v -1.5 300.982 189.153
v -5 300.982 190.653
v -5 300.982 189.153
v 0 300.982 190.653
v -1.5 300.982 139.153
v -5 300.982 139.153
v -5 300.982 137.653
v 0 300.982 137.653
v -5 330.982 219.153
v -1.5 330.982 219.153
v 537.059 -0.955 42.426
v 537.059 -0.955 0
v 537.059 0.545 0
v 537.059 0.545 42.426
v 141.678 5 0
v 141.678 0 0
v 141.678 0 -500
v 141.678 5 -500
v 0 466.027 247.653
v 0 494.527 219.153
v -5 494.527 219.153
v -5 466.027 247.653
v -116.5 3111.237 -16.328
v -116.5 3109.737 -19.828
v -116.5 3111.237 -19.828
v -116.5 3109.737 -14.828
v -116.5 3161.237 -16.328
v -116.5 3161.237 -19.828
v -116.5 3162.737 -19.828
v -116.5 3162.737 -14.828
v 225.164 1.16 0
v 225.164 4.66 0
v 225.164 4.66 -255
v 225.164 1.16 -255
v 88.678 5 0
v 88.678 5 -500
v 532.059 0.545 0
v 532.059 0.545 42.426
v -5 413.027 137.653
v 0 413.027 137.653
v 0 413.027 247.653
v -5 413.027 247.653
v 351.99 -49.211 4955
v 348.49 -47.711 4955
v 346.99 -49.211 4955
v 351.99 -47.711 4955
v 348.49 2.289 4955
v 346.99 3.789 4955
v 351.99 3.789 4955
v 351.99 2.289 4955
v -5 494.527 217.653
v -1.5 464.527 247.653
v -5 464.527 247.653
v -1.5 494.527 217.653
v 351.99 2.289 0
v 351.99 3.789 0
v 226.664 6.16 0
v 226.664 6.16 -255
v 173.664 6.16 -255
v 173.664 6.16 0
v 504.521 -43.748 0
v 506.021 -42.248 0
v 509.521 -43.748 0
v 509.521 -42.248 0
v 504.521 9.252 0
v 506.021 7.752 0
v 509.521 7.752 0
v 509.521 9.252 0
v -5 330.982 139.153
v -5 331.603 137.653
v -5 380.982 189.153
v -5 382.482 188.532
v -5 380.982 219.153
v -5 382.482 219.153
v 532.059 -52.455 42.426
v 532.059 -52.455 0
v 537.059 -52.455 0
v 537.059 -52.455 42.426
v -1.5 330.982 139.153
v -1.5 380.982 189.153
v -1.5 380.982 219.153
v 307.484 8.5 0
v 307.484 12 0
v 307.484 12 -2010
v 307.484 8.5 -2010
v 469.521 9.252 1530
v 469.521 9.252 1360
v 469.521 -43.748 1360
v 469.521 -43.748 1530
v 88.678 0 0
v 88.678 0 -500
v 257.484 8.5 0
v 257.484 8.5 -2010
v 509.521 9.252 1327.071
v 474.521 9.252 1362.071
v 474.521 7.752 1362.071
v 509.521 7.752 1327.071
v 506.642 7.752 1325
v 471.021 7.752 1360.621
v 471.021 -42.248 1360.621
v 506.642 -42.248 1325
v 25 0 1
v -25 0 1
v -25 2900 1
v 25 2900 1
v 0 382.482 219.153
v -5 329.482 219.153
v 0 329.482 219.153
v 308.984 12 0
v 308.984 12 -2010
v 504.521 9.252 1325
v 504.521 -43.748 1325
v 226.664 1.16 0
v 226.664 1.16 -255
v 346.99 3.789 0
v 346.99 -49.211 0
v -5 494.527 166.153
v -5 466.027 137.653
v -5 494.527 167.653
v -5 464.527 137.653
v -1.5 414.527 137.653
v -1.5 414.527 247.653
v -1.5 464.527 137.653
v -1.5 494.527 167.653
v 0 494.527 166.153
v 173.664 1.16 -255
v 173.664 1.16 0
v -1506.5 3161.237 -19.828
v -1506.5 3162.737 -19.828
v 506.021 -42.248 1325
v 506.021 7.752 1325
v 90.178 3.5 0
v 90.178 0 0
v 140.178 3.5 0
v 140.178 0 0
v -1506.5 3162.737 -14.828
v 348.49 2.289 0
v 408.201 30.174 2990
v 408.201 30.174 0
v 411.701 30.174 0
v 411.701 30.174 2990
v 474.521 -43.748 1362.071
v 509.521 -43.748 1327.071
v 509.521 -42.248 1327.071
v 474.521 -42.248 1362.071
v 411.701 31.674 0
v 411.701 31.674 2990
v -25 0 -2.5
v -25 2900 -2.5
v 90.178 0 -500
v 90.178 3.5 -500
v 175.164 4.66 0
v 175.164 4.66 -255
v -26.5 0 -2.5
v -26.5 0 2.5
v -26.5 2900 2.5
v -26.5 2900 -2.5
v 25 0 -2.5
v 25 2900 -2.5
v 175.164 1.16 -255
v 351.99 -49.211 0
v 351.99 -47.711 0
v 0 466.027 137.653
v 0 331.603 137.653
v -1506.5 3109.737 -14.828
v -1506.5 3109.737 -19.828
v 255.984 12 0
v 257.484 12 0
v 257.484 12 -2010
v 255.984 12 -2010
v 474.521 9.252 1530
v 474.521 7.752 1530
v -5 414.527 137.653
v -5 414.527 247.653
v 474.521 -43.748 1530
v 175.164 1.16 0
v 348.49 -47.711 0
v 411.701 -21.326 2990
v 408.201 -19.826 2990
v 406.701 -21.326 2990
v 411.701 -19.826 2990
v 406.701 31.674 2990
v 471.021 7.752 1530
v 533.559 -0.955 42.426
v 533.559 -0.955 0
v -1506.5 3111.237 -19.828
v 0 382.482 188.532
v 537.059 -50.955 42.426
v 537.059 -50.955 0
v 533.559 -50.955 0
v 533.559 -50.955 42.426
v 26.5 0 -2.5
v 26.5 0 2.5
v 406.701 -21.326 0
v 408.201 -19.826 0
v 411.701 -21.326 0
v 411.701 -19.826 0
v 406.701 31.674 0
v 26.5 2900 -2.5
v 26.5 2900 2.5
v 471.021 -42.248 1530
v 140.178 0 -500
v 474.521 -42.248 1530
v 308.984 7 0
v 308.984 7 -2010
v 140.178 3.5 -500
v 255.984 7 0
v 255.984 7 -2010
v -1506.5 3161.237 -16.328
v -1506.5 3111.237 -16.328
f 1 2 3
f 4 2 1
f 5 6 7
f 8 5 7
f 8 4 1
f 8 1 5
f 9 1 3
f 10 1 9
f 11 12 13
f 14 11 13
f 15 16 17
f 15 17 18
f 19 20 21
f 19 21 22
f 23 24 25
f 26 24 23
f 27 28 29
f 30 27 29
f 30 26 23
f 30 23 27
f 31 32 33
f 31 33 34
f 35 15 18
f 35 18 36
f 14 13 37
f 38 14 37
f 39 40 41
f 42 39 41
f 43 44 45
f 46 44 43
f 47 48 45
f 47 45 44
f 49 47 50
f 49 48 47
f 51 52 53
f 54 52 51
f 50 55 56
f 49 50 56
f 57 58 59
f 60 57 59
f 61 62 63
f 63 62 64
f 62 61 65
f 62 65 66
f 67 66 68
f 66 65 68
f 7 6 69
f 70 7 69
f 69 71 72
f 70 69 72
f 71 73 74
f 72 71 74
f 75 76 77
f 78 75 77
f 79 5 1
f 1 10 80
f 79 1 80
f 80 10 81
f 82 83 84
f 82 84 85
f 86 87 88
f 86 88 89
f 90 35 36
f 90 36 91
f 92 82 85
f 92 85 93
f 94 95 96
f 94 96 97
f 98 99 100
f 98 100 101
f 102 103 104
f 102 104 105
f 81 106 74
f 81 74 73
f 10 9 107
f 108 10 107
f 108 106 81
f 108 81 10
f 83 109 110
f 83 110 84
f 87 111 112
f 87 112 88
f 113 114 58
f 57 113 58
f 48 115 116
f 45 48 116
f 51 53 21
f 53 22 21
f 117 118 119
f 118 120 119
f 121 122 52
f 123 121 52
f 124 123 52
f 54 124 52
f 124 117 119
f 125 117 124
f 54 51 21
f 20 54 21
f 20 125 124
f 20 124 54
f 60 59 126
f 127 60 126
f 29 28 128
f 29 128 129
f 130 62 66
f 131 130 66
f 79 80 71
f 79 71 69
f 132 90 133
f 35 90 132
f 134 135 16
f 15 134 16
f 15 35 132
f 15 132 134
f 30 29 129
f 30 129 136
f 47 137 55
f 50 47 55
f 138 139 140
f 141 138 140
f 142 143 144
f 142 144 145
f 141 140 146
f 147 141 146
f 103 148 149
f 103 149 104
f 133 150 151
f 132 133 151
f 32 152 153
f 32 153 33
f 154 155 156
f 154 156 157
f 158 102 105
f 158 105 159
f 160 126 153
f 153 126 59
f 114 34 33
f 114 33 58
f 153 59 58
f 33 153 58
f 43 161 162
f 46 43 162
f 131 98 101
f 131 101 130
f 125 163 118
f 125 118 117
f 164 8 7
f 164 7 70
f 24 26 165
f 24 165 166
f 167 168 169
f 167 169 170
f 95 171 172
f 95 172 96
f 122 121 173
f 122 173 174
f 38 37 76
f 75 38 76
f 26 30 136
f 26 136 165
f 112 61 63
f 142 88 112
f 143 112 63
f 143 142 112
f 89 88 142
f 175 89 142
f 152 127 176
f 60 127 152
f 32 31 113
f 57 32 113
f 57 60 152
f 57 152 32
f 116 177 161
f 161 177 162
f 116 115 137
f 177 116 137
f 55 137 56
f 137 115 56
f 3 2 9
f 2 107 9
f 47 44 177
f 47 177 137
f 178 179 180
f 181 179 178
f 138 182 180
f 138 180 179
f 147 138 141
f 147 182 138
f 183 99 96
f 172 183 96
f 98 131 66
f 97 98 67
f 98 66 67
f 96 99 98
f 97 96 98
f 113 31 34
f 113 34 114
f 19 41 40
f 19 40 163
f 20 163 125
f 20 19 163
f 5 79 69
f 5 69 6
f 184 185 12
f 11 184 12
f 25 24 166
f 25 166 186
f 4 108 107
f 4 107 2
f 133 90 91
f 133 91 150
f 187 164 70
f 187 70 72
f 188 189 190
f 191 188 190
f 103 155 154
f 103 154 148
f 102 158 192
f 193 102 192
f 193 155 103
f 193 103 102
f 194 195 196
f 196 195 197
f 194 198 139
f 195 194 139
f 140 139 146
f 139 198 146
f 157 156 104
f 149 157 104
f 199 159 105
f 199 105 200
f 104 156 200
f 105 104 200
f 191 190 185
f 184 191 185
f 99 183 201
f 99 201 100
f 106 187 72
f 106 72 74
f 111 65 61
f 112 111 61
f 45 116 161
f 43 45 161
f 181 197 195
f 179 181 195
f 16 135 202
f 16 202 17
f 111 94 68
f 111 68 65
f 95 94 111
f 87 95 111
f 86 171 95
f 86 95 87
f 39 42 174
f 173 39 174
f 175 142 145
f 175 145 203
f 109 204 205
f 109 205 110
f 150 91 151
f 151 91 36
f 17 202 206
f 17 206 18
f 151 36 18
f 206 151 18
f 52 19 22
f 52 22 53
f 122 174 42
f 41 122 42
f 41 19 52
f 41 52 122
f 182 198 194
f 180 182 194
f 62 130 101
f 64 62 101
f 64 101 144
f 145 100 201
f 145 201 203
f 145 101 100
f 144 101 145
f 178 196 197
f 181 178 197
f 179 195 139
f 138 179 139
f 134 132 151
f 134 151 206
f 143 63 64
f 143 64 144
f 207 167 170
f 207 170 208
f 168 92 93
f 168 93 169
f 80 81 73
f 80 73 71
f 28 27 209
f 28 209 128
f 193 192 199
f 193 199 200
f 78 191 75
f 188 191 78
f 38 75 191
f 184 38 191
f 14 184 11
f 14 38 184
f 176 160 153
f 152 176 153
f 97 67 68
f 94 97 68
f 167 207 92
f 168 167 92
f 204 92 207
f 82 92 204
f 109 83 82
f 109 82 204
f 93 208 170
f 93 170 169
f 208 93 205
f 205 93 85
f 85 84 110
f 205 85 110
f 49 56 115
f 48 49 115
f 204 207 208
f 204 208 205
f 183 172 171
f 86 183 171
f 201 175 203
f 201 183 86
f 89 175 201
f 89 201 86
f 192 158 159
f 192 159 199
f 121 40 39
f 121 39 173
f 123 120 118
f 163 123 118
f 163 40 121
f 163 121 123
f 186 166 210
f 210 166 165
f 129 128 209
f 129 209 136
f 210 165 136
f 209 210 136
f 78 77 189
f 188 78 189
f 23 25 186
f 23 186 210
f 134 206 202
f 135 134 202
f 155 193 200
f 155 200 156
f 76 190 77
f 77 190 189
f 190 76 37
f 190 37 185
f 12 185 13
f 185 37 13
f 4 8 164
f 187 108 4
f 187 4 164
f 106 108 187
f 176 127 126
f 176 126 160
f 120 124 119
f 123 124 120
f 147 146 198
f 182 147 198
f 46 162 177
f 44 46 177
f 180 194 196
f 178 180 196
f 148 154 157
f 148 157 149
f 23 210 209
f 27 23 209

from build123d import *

# Parameters (mm, degrees)
F1_DEPTH  = 2900
F3_DEPTH  = 1.5
F2_W      = 1.5
F2_H      = 1.5
F2_W_2    = 107
F5_DEPTH  = 5
F4_W      = 110
F4_H      = 1.5
F8_DEPTH  = 1390
F12_DEPTH = 500
F14_DEPTH = 255
F16_DEPTH = 2010
F18_DEPTH = 4955
F20_DEPTH = 2990
F22_DEPTH = 1325
F24_DEPTH = 53
F26_DEPTH = 1.5
F28_DEPTH = 1.5
F30_DEPTH = 1.5
F32_DEPTH = 5
F33_W     = 1.5
F33_H     = 110
F34_DEPTH = 1.5
F35_W     = 1.5
F35_H     = 110
F36_DEPTH = 5
F38_DEPTH = 42.426


with BuildPart() as f1:
    # F0 (on Front) → F1 (new body)
    with BuildSketch(Plane.XZ):
        Polygon((26.5, 2.5), (-26.5, 2.5), (-26.5, -2.5), (-25, -2.5), (-25, 1), (25, 1), (25, -2.5), (26.5, -2.5), align=None)
    extrude(amount=-F1_DEPTH)


with BuildPart() as f3:
    # F2 (on face) → F3 (new body)
    with BuildSketch(Plane.XY.offset(2.5)):
        Polygon((-53.1268492341, 3159.1791344084), (-53.1268492341, 3107.1035304006), (-15.9251292085, 3065.7682859277), (36.2429143985, 3065.7682859277), (36.2429143985, 3097.8594257045), (-20.97491274, 3159.1791344084), align=None)
        Polygon((-15.2570856015, 3067.2682859277), (-51.6268492341, 3107.6791344084), (-51.6268492341, 3157.6791344084), (-21.6268492341, 3157.6791344084), (34.7429143985, 3097.2682859277), (34.7429143985, 3067.2682859277), align=None, mode=Mode.SUBTRACT)
        Polygon((-51.6268492341, 3157.6791344084), (-51.6268492341, 3107.6791344084), (-15.2570856015, 3067.2682859277), (34.7429143985, 3067.2682859277), (34.7429143985, 3097.2682859277), (-21.6268492341, 3157.6791344084), align=None)
    extrude(amount=-F3_DEPTH)

    # F4 (on face) → F5 (join)
    with BuildSketch(Plane.XY.offset(2.5)):
        Polygon((-15.2570856015, 3067.2682859277), (-51.6268492341, 3107.6791344084), (-53.1268492341, 3107.1035304006), (-15.9251292085, 3065.7682859277), (36.2429143985, 3065.7682859277), (36.2429143985, 3067.2682859277), align=None)
        Polygon((-20.97491274, 3159.1791344084), (-53.1268492341, 3159.1791344084), (-53.1268492341, 3157.6791344084), (-21.6268492341, 3157.6791344084), (34.1913179497, 3097.8594257045), (36.2429143985, 3097.8594257045), align=None)
    extrude(amount=-F5_DEPTH)


with BuildPart() as f3b:
    # F2 (on face) → F3, piece 2 (new body)
    with BuildSketch(Plane.XY.offset(2.5)):
        with Locations((35.4929143985, 3234.8632164001)):
            Rectangle(F2_W, F2_H)
        with Locations((-18.7570856015, 3234.8632164001)):
            Rectangle(F2_W_2, F2_H)
        Polygon((34.7429143985, 3235.6132164001), (36.2429143985, 3235.6132164001), (36.2429143985, 3287.1132164001), (7.7429143985, 3315.6132164002), (6.6822542268, 3314.5525562284), (34.7429143985, 3286.4918960566), align=None)
        with Locations((-73.0070856015, 3234.8632164001)):
            Rectangle(F2_W, F2_H)
        Polygon((-72.2570856015, 3235.6132164001), (34.7429143985, 3235.6132164001), (34.7429143985, 3286.4918960566), (6.6822542268, 3314.5525562284), (7.7429143985, 3315.6132164002), (-45.2570856015, 3315.6132164002), (-44.1964254297, 3314.5525562284), (-72.2570856015, 3286.4918960566), align=None)
        Polygon((-73.7570856015, 3235.6132164001), (-72.2570856015, 3235.6132164001), (-72.2570856015, 3286.4918960566), (-44.1964254297, 3314.5525562284), (-45.2570856015, 3315.6132164002), (-73.7570856015, 3287.1132164002), align=None)
    extrude(amount=-F3_DEPTH)

    # F4 (on face) → F5, piece 2 (join)
    with BuildSketch(Plane.XY.offset(2.5)):
        with Locations((-18.7570856015, 3234.8632164001)):
            Rectangle(F4_W, F4_H)
        Polygon((-45.2570856015, 3315.6132164002), (-73.7570856015, 3287.1132164002), (-72.2570856015, 3286.4918960566), (-44.1964254297, 3314.5525562284), align=None)
        Polygon((36.2429143986, 3287.1132164002), (7.7429143985, 3315.6132164002), (6.6822542268, 3314.5525562284), (34.7429143985, 3286.4918960566), align=None)
    extrude(amount=-F5_DEPTH)


with BuildPart() as f8:
    # F7 (on offset) → F8 (new body)
    with BuildSketch(Plane.YZ.offset(-116.5)):
        Polygon((3162.7369973628, -14.8281034827), (3109.7369973628, -14.8281034827), (3109.7369973628, -19.8281034827), (3111.2369973628, -19.8281034827), (3111.2369973628, -16.3281034827), (3161.2369973628, -16.3281034827), (3161.2369973628, -19.8281034827), (3162.7369973628, -19.8281034827), align=None)
    extrude(amount=-F8_DEPTH)


with BuildPart() as f12:
    # F11 (on Top) → F12 (new body)
    with BuildSketch(Plane.XY):
        Polygon((88.6783855637, 5), (88.6783855637, 0), (90.1783855637, 0), (90.1783855637, 3.5), (140.1783855637, 3.5), (140.1783855637, 0), (141.6783855637, 0), (141.6783855637, 5), align=None)
    extrude(amount=-F12_DEPTH)


with BuildPart() as f14:
    # F13 (on Top) → F14 (new body)
    with BuildSketch(Plane.XY):
        Polygon((173.6638098955, 6.1604457395), (173.6638098955, 1.1604457395), (175.1638098955, 1.1604457395), (175.1638098955, 4.6604457395), (225.1638098955, 4.6604457395), (225.1638098955, 1.1604457395), (226.6638098955, 1.1604457395), (226.6638098955, 6.1604457395), align=None)
    extrude(amount=-F14_DEPTH)


with BuildPart() as f16:
    # F15 (on Top) → F16 (new body)
    with BuildSketch(Plane.XY):
        Polygon((308.984041214, 6.9999982417), (308.984041214, 11.9999982417), (307.484041214, 11.9999982417), (307.484041214, 8.4999982417), (257.484041214, 8.4999982417), (257.484041214, 11.9999982417), (255.984041214, 11.9999982417), (255.984041214, 6.9999982417), align=None)
    extrude(amount=-F16_DEPTH)


with BuildPart() as f18:
    # F17 (on Top) → F18 (new body)
    with BuildSketch(Plane.XY):
        Polygon((346.9899594784, -49.2111159693), (351.9899594784, -49.2111159693), (351.9899594784, -47.7111159693), (348.4899594784, -47.7111159693), (348.4899594784, 2.2888840307), (351.9899594784, 2.2888840307), (351.9899594784, 3.7888840307), (346.9899594784, 3.7888840307), align=None)
    extrude(amount=F18_DEPTH)


with BuildPart() as f20:
    # F19 (on Top) → F20 (new body)
    with BuildSketch(Plane.XY):
        Polygon((406.7006984122, -21.3258991353), (411.7006984122, -21.3258991353), (411.7006984122, -19.8258991353), (408.2006984122, -19.8258991353), (408.2006984122, 30.1741008647), (411.7006984122, 30.1741008647), (411.7006984122, 31.6741008647), (406.7006984122, 31.6741008647), align=None)
    extrude(amount=F20_DEPTH)


with BuildPart() as f22:
    # F21 (on Top) → F22 (new body)
    with BuildSketch(Plane.XY):
        Polygon((504.5208015807, -43.74790968), (509.5208015807, -43.74790968), (509.5208015807, -42.24790968), (506.0208015807, -42.24790968), (506.0208015807, 7.75209032), (509.5208015807, 7.75209032), (509.5208015807, 9.25209032), (504.5208015807, 9.25209032), align=None)
    extrude(amount=F22_DEPTH)

    # F23 (on face) → F24 (join)
    with BuildSketch(Plane(origin=(0, 9.25209032, 0), x_dir=(-1, 0, 0), z_dir=(0, 1, 0))):
        Polygon((-506.6421219242, 1325), (-504.5208015807, 1325), (-469.5211372323, 1359.9996643484), (-469.5211372323, 1529.9996643484), (-471.0211372323, 1529.9996643484), (-471.0211372323, 1360.6209846919), align=None)
    extrude(amount=-F24_DEPTH)

    # F25 (on face) → F26 (join)
    with BuildSketch(Plane(origin=(0, 9.25209032, 0), x_dir=(-1, 0, 0), z_dir=(0, 1, 0))):
        Polygon((-469.5211372323, 1359.9996643484), (-469.5211372323, 1529.9996643484), (-474.5211372323, 1529.9996643484), (-474.5211372323, 1362.0707321603), (-509.5208015807, 1327.0710678119), (-509.5208015807, 1325), (-504.5208015807, 1325), align=None)
    extrude(amount=-F26_DEPTH)

    # F27 (on face) → F28 (join)
    with BuildSketch(Plane.XZ.offset(43.74790968)):
        Polygon((509.5208015807, 1325), (509.5208015807, 1327.0710678119), (474.5211372323, 1362.0707321603), (474.5211372323, 1529.9996643484), (471.0211372323, 1529.9996643484), (469.5211372323, 1529.9996643484), (469.5211372323, 1359.9996643484), (504.5208015807, 1325), (506.6421219242, 1325), align=None)
    extrude(amount=-F28_DEPTH)


with BuildPart() as f30:
    # F29 (on Right) → F30 (new body)
    with BuildSketch(Plane.YZ):
        Polygon((300.9817004204, 189.1530245543), (300.9817004204, 139.1530245543), (330.9817004204, 139.1530245543), (380.9817004204, 189.1530245543), (380.9817004204, 219.1530245543), (330.9817004204, 219.1530245543), align=None)
        Polygon((330.9817004204, 139.1530245543), (300.9817004204, 139.1530245543), (300.9817004204, 137.6530245543), (331.6030207639, 137.6530245543), (382.4817004204, 188.5317042107), (382.4817004204, 219.1530245543), (380.9817004204, 219.1530245543), (380.9817004204, 189.1530245543), align=None)
        Polygon((300.9817004204, 190.6530245543), (300.9817004204, 189.1530245543), (330.9817004204, 219.1530245543), (329.4817004204, 219.1530245543), align=None)
    extrude(amount=-F30_DEPTH)

    # F31 (on face) → F32 (join)
    with BuildSketch(Plane.YZ):
        Polygon((300.9817004204, 190.6530245543), (300.9817004204, 189.1530245543), (330.9817004204, 219.1530245543), (329.4817004204, 219.1530245543), align=None)
        Polygon((382.4817004204, 188.5317042107), (382.4817004204, 219.1530245543), (380.9817004204, 219.1530245543), (380.9817004204, 189.1530245543), (330.9817004204, 139.1530245543), (300.9817004204, 139.1530245543), (300.9817004204, 137.6530245543), (331.6030207639, 137.6530245543), align=None)
    extrude(amount=-F32_DEPTH)


with BuildPart() as f34:
    # F33 (on face) → F34 (new body)
    with BuildSketch(Plane.YZ):
        with Locations((413.7773685455, 192.6530245543)):
            Rectangle(F33_W, F33_H)
        Polygon((414.5273685455, 247.6530245543), (414.5273685455, 137.6530245543), (464.5273685455, 137.6530245543), (494.5273685455, 167.6530245543), (494.5273685455, 217.6530245543), (464.5273685455, 247.6530245543), align=None)
        Polygon((494.5273685455, 167.6530245543), (464.5273685455, 137.6530245543), (466.0273685455, 137.6530245543), (494.5273685455, 166.1530245543), align=None)
        Polygon((466.0273685455, 247.6530245543), (464.5273685455, 247.6530245543), (494.5273685455, 217.6530245543), (494.5273685455, 219.1530245543), align=None)
    extrude(amount=-F34_DEPTH)

    # F35 (on face) → F36 (join)
    with BuildSketch(Plane.YZ):
        with Locations((413.7773685455, 192.6530245543)):
            Rectangle(F35_W, F35_H)
        Polygon((464.5273685455, 247.6530245543), (494.5273685455, 217.6530245543), (494.5273685455, 219.1530245543), (466.0273685455, 247.6530245543), align=None)
        Polygon((466.0273685455, 137.6530245543), (494.5273685455, 166.1530245543), (494.5273685455, 167.6530245543), (464.5273685455, 137.6530245543), align=None)
    extrude(amount=-F36_DEPTH)


with BuildPart() as f38:
    # F37 (on Top) → F38 (new body)
    with BuildSketch(Plane.XY):
        Polygon((532.058924675, -52.4545780718), (537.058924675, -52.4545780718), (537.058924675, -50.9545780718), (533.558924675, -50.9545780718), (533.558924675, -0.9545780718), (537.058924675, -0.9545780718), (537.058924675, 0.5454219282), (532.058924675, 0.5454219282), align=None)
    extrude(amount=F38_DEPTH)


solid = Compound([f1.part, f8.part, f12.part, f14.part, f16.part, f18.part, f20.part, f22.part, f30.part, f34.part, f38.part])
